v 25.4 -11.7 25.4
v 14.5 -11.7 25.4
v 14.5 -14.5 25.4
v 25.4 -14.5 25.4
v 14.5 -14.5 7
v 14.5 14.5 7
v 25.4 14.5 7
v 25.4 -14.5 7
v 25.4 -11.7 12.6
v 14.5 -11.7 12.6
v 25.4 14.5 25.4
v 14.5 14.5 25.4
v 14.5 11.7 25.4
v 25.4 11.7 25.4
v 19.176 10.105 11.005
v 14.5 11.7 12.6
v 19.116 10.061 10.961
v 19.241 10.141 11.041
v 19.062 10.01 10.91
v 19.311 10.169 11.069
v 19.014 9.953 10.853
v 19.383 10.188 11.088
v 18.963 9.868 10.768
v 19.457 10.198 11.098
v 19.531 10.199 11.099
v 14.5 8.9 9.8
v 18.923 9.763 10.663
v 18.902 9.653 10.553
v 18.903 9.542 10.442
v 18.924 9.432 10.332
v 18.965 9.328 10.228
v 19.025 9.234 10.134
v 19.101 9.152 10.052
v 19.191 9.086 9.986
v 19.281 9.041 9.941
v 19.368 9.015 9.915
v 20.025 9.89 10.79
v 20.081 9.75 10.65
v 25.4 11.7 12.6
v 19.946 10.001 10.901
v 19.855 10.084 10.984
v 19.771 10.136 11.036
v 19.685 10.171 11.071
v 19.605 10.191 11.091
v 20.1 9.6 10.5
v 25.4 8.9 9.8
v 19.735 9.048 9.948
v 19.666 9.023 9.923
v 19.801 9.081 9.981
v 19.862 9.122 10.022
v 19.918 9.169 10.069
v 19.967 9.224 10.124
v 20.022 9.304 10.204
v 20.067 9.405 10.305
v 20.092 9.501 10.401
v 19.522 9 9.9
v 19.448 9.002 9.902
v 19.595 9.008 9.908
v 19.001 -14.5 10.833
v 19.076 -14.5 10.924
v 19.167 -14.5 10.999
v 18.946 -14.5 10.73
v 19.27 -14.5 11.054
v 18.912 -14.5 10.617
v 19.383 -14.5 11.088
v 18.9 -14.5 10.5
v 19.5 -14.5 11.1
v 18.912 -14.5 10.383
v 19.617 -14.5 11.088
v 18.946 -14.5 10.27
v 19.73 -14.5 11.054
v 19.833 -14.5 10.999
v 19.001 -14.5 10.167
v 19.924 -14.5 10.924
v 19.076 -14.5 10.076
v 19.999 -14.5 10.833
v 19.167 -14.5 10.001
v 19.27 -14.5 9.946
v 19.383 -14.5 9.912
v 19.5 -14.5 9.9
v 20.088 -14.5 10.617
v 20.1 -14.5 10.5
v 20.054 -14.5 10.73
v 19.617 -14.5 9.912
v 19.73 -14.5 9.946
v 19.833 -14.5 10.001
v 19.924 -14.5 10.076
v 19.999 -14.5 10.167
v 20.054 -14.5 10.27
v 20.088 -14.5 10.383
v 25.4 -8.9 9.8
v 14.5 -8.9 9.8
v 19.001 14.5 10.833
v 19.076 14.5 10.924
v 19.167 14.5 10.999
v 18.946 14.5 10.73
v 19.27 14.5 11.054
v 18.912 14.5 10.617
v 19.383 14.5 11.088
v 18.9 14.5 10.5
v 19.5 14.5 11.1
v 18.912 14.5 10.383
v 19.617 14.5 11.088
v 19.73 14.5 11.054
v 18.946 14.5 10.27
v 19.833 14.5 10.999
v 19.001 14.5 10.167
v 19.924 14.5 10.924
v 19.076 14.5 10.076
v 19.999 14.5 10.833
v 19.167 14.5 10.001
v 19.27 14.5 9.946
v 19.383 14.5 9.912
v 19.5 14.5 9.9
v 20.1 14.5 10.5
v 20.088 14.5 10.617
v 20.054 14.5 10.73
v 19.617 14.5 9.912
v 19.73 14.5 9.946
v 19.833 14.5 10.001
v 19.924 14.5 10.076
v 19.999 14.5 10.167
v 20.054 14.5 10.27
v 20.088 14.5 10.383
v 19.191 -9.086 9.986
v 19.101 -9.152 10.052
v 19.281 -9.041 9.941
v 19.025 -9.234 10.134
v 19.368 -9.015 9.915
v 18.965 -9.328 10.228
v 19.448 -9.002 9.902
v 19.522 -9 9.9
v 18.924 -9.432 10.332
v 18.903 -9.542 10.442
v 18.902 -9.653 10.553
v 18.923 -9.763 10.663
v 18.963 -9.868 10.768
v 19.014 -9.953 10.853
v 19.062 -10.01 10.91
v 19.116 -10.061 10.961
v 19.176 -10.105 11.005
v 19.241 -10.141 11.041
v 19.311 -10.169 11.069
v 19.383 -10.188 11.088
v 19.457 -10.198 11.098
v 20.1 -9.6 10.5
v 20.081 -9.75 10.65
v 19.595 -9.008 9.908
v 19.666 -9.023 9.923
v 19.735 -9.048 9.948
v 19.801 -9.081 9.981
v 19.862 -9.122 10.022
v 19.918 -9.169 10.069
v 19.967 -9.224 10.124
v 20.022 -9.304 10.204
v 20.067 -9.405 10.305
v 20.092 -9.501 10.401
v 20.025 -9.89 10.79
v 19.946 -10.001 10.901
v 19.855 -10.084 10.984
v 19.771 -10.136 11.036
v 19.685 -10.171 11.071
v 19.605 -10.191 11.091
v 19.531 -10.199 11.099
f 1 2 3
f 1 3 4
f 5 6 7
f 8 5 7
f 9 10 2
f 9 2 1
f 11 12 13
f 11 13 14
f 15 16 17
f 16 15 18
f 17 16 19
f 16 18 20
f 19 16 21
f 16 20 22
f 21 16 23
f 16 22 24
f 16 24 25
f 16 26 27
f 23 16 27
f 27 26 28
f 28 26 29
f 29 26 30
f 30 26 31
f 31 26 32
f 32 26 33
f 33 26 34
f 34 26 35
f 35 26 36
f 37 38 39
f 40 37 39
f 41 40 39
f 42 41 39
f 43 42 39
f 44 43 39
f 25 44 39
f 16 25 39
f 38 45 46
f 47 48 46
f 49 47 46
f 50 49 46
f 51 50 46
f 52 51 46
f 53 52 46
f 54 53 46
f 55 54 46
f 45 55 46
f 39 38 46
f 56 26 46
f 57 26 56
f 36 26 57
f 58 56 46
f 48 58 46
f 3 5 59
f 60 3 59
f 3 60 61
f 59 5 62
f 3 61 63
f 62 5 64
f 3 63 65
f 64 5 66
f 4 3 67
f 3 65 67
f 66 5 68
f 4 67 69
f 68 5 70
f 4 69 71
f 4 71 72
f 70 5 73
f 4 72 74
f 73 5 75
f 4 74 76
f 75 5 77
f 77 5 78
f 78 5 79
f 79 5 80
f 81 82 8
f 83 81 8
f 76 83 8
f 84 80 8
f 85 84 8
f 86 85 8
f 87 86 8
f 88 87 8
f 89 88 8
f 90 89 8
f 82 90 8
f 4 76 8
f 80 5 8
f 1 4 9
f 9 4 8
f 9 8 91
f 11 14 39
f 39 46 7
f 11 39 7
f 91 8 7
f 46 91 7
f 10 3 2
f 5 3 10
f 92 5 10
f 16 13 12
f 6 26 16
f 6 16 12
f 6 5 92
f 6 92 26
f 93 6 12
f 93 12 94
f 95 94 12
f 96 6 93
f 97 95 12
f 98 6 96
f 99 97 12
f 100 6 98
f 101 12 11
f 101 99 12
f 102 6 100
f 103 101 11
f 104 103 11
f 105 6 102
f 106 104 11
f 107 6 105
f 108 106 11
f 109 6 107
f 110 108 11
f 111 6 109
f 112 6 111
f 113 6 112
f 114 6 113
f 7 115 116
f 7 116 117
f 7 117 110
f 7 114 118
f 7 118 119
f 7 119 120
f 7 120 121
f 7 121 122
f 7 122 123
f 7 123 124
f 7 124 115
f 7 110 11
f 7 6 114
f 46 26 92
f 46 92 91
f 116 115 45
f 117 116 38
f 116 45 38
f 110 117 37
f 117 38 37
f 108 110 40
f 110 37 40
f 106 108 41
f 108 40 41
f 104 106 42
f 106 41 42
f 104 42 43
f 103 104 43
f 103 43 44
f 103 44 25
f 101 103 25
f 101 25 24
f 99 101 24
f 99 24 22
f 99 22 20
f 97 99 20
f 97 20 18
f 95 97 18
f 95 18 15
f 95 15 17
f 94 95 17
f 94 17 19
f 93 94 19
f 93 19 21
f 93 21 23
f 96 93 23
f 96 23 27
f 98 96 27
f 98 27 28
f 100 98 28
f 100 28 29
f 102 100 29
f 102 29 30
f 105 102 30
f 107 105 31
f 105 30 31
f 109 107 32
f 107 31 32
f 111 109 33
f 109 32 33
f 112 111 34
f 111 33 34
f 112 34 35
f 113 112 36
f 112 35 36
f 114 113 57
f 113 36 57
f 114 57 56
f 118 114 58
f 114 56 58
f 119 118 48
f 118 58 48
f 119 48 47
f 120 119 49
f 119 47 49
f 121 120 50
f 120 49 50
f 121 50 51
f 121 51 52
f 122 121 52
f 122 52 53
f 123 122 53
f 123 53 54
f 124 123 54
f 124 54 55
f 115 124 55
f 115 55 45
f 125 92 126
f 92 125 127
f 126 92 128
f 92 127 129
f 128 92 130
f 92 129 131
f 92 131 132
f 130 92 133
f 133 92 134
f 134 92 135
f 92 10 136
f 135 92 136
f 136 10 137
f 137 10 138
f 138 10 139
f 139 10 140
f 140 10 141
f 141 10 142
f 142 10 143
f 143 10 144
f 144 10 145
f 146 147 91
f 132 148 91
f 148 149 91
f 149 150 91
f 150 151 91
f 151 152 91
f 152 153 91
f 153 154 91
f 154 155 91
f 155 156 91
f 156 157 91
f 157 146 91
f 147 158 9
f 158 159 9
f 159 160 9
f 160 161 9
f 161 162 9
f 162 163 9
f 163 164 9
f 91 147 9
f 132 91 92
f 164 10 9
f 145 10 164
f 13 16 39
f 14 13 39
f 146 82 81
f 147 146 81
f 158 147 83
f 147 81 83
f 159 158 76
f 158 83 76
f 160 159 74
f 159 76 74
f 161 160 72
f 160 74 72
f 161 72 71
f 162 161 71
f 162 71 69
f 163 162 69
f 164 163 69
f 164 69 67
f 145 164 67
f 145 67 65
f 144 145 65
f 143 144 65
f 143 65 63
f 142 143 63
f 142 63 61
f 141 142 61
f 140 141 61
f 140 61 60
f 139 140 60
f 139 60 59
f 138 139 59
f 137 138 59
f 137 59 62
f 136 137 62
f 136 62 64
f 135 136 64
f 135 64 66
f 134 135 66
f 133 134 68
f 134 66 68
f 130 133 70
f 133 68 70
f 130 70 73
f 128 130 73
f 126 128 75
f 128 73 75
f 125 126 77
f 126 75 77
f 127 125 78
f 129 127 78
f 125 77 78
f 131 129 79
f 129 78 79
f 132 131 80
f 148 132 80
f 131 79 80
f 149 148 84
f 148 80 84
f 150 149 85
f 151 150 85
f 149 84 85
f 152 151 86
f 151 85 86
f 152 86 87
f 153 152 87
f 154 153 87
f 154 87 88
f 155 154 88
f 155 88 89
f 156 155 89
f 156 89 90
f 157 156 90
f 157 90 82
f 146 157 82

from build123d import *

# Parameters (mm, degrees)
SKETCH023_W     = 10.9
SKETCH023_H     = 29
PAD007_DEPTH    = 2.8
SKETCH024_W     = 10.9
SKETCH024_H     = 2.8
PAD008_DEPTH    = 15.6
CHAMFER_SIZE    = 2.8
SKETCH025_R     = 0.6
POCKET014_DEPTH = 29.001


with BuildPart() as part:
    # Sketch023 (on DatumPlane) → Pad007 (new body)
    with BuildSketch(Plane.XY.offset(7)):
        with Locations((19.95, 0)):
            Rectangle(SKETCH023_W, SKETCH023_H)
    extrude(amount=PAD007_DEPTH)

    # Sketch024 (on DatumPlane) → Pad008 (join)
    with BuildSketch(Plane.XY.offset(9.8)):
        with Locations((19.95, -13.1)):
            Rectangle(SKETCH024_W, SKETCH024_H)
        with Locations((19.95, 13.1)):
            Rectangle(SKETCH024_W, SKETCH024_H)
    extrude(amount=PAD008_DEPTH)

    # Chamfer
    chamfer_edges = [part.edges().sort_by_distance(p)[0] for p in [
        (19.95, 11.7, 9.8),
        (19.95, -11.7, 9.8),
    ]]
    chamfer(chamfer_edges, length=CHAMFER_SIZE)

    # Sketch025 (on DatumPlane) → Pocket014 (cut, through all)
    with BuildSketch(Plane.XZ.offset(14.5)):
        with Locations((19.5, 10.5)):
            Circle(SKETCH025_R)
    extrude(amount=-POCKET014_DEPTH, mode=Mode.SUBTRACT)


solid = part.part
